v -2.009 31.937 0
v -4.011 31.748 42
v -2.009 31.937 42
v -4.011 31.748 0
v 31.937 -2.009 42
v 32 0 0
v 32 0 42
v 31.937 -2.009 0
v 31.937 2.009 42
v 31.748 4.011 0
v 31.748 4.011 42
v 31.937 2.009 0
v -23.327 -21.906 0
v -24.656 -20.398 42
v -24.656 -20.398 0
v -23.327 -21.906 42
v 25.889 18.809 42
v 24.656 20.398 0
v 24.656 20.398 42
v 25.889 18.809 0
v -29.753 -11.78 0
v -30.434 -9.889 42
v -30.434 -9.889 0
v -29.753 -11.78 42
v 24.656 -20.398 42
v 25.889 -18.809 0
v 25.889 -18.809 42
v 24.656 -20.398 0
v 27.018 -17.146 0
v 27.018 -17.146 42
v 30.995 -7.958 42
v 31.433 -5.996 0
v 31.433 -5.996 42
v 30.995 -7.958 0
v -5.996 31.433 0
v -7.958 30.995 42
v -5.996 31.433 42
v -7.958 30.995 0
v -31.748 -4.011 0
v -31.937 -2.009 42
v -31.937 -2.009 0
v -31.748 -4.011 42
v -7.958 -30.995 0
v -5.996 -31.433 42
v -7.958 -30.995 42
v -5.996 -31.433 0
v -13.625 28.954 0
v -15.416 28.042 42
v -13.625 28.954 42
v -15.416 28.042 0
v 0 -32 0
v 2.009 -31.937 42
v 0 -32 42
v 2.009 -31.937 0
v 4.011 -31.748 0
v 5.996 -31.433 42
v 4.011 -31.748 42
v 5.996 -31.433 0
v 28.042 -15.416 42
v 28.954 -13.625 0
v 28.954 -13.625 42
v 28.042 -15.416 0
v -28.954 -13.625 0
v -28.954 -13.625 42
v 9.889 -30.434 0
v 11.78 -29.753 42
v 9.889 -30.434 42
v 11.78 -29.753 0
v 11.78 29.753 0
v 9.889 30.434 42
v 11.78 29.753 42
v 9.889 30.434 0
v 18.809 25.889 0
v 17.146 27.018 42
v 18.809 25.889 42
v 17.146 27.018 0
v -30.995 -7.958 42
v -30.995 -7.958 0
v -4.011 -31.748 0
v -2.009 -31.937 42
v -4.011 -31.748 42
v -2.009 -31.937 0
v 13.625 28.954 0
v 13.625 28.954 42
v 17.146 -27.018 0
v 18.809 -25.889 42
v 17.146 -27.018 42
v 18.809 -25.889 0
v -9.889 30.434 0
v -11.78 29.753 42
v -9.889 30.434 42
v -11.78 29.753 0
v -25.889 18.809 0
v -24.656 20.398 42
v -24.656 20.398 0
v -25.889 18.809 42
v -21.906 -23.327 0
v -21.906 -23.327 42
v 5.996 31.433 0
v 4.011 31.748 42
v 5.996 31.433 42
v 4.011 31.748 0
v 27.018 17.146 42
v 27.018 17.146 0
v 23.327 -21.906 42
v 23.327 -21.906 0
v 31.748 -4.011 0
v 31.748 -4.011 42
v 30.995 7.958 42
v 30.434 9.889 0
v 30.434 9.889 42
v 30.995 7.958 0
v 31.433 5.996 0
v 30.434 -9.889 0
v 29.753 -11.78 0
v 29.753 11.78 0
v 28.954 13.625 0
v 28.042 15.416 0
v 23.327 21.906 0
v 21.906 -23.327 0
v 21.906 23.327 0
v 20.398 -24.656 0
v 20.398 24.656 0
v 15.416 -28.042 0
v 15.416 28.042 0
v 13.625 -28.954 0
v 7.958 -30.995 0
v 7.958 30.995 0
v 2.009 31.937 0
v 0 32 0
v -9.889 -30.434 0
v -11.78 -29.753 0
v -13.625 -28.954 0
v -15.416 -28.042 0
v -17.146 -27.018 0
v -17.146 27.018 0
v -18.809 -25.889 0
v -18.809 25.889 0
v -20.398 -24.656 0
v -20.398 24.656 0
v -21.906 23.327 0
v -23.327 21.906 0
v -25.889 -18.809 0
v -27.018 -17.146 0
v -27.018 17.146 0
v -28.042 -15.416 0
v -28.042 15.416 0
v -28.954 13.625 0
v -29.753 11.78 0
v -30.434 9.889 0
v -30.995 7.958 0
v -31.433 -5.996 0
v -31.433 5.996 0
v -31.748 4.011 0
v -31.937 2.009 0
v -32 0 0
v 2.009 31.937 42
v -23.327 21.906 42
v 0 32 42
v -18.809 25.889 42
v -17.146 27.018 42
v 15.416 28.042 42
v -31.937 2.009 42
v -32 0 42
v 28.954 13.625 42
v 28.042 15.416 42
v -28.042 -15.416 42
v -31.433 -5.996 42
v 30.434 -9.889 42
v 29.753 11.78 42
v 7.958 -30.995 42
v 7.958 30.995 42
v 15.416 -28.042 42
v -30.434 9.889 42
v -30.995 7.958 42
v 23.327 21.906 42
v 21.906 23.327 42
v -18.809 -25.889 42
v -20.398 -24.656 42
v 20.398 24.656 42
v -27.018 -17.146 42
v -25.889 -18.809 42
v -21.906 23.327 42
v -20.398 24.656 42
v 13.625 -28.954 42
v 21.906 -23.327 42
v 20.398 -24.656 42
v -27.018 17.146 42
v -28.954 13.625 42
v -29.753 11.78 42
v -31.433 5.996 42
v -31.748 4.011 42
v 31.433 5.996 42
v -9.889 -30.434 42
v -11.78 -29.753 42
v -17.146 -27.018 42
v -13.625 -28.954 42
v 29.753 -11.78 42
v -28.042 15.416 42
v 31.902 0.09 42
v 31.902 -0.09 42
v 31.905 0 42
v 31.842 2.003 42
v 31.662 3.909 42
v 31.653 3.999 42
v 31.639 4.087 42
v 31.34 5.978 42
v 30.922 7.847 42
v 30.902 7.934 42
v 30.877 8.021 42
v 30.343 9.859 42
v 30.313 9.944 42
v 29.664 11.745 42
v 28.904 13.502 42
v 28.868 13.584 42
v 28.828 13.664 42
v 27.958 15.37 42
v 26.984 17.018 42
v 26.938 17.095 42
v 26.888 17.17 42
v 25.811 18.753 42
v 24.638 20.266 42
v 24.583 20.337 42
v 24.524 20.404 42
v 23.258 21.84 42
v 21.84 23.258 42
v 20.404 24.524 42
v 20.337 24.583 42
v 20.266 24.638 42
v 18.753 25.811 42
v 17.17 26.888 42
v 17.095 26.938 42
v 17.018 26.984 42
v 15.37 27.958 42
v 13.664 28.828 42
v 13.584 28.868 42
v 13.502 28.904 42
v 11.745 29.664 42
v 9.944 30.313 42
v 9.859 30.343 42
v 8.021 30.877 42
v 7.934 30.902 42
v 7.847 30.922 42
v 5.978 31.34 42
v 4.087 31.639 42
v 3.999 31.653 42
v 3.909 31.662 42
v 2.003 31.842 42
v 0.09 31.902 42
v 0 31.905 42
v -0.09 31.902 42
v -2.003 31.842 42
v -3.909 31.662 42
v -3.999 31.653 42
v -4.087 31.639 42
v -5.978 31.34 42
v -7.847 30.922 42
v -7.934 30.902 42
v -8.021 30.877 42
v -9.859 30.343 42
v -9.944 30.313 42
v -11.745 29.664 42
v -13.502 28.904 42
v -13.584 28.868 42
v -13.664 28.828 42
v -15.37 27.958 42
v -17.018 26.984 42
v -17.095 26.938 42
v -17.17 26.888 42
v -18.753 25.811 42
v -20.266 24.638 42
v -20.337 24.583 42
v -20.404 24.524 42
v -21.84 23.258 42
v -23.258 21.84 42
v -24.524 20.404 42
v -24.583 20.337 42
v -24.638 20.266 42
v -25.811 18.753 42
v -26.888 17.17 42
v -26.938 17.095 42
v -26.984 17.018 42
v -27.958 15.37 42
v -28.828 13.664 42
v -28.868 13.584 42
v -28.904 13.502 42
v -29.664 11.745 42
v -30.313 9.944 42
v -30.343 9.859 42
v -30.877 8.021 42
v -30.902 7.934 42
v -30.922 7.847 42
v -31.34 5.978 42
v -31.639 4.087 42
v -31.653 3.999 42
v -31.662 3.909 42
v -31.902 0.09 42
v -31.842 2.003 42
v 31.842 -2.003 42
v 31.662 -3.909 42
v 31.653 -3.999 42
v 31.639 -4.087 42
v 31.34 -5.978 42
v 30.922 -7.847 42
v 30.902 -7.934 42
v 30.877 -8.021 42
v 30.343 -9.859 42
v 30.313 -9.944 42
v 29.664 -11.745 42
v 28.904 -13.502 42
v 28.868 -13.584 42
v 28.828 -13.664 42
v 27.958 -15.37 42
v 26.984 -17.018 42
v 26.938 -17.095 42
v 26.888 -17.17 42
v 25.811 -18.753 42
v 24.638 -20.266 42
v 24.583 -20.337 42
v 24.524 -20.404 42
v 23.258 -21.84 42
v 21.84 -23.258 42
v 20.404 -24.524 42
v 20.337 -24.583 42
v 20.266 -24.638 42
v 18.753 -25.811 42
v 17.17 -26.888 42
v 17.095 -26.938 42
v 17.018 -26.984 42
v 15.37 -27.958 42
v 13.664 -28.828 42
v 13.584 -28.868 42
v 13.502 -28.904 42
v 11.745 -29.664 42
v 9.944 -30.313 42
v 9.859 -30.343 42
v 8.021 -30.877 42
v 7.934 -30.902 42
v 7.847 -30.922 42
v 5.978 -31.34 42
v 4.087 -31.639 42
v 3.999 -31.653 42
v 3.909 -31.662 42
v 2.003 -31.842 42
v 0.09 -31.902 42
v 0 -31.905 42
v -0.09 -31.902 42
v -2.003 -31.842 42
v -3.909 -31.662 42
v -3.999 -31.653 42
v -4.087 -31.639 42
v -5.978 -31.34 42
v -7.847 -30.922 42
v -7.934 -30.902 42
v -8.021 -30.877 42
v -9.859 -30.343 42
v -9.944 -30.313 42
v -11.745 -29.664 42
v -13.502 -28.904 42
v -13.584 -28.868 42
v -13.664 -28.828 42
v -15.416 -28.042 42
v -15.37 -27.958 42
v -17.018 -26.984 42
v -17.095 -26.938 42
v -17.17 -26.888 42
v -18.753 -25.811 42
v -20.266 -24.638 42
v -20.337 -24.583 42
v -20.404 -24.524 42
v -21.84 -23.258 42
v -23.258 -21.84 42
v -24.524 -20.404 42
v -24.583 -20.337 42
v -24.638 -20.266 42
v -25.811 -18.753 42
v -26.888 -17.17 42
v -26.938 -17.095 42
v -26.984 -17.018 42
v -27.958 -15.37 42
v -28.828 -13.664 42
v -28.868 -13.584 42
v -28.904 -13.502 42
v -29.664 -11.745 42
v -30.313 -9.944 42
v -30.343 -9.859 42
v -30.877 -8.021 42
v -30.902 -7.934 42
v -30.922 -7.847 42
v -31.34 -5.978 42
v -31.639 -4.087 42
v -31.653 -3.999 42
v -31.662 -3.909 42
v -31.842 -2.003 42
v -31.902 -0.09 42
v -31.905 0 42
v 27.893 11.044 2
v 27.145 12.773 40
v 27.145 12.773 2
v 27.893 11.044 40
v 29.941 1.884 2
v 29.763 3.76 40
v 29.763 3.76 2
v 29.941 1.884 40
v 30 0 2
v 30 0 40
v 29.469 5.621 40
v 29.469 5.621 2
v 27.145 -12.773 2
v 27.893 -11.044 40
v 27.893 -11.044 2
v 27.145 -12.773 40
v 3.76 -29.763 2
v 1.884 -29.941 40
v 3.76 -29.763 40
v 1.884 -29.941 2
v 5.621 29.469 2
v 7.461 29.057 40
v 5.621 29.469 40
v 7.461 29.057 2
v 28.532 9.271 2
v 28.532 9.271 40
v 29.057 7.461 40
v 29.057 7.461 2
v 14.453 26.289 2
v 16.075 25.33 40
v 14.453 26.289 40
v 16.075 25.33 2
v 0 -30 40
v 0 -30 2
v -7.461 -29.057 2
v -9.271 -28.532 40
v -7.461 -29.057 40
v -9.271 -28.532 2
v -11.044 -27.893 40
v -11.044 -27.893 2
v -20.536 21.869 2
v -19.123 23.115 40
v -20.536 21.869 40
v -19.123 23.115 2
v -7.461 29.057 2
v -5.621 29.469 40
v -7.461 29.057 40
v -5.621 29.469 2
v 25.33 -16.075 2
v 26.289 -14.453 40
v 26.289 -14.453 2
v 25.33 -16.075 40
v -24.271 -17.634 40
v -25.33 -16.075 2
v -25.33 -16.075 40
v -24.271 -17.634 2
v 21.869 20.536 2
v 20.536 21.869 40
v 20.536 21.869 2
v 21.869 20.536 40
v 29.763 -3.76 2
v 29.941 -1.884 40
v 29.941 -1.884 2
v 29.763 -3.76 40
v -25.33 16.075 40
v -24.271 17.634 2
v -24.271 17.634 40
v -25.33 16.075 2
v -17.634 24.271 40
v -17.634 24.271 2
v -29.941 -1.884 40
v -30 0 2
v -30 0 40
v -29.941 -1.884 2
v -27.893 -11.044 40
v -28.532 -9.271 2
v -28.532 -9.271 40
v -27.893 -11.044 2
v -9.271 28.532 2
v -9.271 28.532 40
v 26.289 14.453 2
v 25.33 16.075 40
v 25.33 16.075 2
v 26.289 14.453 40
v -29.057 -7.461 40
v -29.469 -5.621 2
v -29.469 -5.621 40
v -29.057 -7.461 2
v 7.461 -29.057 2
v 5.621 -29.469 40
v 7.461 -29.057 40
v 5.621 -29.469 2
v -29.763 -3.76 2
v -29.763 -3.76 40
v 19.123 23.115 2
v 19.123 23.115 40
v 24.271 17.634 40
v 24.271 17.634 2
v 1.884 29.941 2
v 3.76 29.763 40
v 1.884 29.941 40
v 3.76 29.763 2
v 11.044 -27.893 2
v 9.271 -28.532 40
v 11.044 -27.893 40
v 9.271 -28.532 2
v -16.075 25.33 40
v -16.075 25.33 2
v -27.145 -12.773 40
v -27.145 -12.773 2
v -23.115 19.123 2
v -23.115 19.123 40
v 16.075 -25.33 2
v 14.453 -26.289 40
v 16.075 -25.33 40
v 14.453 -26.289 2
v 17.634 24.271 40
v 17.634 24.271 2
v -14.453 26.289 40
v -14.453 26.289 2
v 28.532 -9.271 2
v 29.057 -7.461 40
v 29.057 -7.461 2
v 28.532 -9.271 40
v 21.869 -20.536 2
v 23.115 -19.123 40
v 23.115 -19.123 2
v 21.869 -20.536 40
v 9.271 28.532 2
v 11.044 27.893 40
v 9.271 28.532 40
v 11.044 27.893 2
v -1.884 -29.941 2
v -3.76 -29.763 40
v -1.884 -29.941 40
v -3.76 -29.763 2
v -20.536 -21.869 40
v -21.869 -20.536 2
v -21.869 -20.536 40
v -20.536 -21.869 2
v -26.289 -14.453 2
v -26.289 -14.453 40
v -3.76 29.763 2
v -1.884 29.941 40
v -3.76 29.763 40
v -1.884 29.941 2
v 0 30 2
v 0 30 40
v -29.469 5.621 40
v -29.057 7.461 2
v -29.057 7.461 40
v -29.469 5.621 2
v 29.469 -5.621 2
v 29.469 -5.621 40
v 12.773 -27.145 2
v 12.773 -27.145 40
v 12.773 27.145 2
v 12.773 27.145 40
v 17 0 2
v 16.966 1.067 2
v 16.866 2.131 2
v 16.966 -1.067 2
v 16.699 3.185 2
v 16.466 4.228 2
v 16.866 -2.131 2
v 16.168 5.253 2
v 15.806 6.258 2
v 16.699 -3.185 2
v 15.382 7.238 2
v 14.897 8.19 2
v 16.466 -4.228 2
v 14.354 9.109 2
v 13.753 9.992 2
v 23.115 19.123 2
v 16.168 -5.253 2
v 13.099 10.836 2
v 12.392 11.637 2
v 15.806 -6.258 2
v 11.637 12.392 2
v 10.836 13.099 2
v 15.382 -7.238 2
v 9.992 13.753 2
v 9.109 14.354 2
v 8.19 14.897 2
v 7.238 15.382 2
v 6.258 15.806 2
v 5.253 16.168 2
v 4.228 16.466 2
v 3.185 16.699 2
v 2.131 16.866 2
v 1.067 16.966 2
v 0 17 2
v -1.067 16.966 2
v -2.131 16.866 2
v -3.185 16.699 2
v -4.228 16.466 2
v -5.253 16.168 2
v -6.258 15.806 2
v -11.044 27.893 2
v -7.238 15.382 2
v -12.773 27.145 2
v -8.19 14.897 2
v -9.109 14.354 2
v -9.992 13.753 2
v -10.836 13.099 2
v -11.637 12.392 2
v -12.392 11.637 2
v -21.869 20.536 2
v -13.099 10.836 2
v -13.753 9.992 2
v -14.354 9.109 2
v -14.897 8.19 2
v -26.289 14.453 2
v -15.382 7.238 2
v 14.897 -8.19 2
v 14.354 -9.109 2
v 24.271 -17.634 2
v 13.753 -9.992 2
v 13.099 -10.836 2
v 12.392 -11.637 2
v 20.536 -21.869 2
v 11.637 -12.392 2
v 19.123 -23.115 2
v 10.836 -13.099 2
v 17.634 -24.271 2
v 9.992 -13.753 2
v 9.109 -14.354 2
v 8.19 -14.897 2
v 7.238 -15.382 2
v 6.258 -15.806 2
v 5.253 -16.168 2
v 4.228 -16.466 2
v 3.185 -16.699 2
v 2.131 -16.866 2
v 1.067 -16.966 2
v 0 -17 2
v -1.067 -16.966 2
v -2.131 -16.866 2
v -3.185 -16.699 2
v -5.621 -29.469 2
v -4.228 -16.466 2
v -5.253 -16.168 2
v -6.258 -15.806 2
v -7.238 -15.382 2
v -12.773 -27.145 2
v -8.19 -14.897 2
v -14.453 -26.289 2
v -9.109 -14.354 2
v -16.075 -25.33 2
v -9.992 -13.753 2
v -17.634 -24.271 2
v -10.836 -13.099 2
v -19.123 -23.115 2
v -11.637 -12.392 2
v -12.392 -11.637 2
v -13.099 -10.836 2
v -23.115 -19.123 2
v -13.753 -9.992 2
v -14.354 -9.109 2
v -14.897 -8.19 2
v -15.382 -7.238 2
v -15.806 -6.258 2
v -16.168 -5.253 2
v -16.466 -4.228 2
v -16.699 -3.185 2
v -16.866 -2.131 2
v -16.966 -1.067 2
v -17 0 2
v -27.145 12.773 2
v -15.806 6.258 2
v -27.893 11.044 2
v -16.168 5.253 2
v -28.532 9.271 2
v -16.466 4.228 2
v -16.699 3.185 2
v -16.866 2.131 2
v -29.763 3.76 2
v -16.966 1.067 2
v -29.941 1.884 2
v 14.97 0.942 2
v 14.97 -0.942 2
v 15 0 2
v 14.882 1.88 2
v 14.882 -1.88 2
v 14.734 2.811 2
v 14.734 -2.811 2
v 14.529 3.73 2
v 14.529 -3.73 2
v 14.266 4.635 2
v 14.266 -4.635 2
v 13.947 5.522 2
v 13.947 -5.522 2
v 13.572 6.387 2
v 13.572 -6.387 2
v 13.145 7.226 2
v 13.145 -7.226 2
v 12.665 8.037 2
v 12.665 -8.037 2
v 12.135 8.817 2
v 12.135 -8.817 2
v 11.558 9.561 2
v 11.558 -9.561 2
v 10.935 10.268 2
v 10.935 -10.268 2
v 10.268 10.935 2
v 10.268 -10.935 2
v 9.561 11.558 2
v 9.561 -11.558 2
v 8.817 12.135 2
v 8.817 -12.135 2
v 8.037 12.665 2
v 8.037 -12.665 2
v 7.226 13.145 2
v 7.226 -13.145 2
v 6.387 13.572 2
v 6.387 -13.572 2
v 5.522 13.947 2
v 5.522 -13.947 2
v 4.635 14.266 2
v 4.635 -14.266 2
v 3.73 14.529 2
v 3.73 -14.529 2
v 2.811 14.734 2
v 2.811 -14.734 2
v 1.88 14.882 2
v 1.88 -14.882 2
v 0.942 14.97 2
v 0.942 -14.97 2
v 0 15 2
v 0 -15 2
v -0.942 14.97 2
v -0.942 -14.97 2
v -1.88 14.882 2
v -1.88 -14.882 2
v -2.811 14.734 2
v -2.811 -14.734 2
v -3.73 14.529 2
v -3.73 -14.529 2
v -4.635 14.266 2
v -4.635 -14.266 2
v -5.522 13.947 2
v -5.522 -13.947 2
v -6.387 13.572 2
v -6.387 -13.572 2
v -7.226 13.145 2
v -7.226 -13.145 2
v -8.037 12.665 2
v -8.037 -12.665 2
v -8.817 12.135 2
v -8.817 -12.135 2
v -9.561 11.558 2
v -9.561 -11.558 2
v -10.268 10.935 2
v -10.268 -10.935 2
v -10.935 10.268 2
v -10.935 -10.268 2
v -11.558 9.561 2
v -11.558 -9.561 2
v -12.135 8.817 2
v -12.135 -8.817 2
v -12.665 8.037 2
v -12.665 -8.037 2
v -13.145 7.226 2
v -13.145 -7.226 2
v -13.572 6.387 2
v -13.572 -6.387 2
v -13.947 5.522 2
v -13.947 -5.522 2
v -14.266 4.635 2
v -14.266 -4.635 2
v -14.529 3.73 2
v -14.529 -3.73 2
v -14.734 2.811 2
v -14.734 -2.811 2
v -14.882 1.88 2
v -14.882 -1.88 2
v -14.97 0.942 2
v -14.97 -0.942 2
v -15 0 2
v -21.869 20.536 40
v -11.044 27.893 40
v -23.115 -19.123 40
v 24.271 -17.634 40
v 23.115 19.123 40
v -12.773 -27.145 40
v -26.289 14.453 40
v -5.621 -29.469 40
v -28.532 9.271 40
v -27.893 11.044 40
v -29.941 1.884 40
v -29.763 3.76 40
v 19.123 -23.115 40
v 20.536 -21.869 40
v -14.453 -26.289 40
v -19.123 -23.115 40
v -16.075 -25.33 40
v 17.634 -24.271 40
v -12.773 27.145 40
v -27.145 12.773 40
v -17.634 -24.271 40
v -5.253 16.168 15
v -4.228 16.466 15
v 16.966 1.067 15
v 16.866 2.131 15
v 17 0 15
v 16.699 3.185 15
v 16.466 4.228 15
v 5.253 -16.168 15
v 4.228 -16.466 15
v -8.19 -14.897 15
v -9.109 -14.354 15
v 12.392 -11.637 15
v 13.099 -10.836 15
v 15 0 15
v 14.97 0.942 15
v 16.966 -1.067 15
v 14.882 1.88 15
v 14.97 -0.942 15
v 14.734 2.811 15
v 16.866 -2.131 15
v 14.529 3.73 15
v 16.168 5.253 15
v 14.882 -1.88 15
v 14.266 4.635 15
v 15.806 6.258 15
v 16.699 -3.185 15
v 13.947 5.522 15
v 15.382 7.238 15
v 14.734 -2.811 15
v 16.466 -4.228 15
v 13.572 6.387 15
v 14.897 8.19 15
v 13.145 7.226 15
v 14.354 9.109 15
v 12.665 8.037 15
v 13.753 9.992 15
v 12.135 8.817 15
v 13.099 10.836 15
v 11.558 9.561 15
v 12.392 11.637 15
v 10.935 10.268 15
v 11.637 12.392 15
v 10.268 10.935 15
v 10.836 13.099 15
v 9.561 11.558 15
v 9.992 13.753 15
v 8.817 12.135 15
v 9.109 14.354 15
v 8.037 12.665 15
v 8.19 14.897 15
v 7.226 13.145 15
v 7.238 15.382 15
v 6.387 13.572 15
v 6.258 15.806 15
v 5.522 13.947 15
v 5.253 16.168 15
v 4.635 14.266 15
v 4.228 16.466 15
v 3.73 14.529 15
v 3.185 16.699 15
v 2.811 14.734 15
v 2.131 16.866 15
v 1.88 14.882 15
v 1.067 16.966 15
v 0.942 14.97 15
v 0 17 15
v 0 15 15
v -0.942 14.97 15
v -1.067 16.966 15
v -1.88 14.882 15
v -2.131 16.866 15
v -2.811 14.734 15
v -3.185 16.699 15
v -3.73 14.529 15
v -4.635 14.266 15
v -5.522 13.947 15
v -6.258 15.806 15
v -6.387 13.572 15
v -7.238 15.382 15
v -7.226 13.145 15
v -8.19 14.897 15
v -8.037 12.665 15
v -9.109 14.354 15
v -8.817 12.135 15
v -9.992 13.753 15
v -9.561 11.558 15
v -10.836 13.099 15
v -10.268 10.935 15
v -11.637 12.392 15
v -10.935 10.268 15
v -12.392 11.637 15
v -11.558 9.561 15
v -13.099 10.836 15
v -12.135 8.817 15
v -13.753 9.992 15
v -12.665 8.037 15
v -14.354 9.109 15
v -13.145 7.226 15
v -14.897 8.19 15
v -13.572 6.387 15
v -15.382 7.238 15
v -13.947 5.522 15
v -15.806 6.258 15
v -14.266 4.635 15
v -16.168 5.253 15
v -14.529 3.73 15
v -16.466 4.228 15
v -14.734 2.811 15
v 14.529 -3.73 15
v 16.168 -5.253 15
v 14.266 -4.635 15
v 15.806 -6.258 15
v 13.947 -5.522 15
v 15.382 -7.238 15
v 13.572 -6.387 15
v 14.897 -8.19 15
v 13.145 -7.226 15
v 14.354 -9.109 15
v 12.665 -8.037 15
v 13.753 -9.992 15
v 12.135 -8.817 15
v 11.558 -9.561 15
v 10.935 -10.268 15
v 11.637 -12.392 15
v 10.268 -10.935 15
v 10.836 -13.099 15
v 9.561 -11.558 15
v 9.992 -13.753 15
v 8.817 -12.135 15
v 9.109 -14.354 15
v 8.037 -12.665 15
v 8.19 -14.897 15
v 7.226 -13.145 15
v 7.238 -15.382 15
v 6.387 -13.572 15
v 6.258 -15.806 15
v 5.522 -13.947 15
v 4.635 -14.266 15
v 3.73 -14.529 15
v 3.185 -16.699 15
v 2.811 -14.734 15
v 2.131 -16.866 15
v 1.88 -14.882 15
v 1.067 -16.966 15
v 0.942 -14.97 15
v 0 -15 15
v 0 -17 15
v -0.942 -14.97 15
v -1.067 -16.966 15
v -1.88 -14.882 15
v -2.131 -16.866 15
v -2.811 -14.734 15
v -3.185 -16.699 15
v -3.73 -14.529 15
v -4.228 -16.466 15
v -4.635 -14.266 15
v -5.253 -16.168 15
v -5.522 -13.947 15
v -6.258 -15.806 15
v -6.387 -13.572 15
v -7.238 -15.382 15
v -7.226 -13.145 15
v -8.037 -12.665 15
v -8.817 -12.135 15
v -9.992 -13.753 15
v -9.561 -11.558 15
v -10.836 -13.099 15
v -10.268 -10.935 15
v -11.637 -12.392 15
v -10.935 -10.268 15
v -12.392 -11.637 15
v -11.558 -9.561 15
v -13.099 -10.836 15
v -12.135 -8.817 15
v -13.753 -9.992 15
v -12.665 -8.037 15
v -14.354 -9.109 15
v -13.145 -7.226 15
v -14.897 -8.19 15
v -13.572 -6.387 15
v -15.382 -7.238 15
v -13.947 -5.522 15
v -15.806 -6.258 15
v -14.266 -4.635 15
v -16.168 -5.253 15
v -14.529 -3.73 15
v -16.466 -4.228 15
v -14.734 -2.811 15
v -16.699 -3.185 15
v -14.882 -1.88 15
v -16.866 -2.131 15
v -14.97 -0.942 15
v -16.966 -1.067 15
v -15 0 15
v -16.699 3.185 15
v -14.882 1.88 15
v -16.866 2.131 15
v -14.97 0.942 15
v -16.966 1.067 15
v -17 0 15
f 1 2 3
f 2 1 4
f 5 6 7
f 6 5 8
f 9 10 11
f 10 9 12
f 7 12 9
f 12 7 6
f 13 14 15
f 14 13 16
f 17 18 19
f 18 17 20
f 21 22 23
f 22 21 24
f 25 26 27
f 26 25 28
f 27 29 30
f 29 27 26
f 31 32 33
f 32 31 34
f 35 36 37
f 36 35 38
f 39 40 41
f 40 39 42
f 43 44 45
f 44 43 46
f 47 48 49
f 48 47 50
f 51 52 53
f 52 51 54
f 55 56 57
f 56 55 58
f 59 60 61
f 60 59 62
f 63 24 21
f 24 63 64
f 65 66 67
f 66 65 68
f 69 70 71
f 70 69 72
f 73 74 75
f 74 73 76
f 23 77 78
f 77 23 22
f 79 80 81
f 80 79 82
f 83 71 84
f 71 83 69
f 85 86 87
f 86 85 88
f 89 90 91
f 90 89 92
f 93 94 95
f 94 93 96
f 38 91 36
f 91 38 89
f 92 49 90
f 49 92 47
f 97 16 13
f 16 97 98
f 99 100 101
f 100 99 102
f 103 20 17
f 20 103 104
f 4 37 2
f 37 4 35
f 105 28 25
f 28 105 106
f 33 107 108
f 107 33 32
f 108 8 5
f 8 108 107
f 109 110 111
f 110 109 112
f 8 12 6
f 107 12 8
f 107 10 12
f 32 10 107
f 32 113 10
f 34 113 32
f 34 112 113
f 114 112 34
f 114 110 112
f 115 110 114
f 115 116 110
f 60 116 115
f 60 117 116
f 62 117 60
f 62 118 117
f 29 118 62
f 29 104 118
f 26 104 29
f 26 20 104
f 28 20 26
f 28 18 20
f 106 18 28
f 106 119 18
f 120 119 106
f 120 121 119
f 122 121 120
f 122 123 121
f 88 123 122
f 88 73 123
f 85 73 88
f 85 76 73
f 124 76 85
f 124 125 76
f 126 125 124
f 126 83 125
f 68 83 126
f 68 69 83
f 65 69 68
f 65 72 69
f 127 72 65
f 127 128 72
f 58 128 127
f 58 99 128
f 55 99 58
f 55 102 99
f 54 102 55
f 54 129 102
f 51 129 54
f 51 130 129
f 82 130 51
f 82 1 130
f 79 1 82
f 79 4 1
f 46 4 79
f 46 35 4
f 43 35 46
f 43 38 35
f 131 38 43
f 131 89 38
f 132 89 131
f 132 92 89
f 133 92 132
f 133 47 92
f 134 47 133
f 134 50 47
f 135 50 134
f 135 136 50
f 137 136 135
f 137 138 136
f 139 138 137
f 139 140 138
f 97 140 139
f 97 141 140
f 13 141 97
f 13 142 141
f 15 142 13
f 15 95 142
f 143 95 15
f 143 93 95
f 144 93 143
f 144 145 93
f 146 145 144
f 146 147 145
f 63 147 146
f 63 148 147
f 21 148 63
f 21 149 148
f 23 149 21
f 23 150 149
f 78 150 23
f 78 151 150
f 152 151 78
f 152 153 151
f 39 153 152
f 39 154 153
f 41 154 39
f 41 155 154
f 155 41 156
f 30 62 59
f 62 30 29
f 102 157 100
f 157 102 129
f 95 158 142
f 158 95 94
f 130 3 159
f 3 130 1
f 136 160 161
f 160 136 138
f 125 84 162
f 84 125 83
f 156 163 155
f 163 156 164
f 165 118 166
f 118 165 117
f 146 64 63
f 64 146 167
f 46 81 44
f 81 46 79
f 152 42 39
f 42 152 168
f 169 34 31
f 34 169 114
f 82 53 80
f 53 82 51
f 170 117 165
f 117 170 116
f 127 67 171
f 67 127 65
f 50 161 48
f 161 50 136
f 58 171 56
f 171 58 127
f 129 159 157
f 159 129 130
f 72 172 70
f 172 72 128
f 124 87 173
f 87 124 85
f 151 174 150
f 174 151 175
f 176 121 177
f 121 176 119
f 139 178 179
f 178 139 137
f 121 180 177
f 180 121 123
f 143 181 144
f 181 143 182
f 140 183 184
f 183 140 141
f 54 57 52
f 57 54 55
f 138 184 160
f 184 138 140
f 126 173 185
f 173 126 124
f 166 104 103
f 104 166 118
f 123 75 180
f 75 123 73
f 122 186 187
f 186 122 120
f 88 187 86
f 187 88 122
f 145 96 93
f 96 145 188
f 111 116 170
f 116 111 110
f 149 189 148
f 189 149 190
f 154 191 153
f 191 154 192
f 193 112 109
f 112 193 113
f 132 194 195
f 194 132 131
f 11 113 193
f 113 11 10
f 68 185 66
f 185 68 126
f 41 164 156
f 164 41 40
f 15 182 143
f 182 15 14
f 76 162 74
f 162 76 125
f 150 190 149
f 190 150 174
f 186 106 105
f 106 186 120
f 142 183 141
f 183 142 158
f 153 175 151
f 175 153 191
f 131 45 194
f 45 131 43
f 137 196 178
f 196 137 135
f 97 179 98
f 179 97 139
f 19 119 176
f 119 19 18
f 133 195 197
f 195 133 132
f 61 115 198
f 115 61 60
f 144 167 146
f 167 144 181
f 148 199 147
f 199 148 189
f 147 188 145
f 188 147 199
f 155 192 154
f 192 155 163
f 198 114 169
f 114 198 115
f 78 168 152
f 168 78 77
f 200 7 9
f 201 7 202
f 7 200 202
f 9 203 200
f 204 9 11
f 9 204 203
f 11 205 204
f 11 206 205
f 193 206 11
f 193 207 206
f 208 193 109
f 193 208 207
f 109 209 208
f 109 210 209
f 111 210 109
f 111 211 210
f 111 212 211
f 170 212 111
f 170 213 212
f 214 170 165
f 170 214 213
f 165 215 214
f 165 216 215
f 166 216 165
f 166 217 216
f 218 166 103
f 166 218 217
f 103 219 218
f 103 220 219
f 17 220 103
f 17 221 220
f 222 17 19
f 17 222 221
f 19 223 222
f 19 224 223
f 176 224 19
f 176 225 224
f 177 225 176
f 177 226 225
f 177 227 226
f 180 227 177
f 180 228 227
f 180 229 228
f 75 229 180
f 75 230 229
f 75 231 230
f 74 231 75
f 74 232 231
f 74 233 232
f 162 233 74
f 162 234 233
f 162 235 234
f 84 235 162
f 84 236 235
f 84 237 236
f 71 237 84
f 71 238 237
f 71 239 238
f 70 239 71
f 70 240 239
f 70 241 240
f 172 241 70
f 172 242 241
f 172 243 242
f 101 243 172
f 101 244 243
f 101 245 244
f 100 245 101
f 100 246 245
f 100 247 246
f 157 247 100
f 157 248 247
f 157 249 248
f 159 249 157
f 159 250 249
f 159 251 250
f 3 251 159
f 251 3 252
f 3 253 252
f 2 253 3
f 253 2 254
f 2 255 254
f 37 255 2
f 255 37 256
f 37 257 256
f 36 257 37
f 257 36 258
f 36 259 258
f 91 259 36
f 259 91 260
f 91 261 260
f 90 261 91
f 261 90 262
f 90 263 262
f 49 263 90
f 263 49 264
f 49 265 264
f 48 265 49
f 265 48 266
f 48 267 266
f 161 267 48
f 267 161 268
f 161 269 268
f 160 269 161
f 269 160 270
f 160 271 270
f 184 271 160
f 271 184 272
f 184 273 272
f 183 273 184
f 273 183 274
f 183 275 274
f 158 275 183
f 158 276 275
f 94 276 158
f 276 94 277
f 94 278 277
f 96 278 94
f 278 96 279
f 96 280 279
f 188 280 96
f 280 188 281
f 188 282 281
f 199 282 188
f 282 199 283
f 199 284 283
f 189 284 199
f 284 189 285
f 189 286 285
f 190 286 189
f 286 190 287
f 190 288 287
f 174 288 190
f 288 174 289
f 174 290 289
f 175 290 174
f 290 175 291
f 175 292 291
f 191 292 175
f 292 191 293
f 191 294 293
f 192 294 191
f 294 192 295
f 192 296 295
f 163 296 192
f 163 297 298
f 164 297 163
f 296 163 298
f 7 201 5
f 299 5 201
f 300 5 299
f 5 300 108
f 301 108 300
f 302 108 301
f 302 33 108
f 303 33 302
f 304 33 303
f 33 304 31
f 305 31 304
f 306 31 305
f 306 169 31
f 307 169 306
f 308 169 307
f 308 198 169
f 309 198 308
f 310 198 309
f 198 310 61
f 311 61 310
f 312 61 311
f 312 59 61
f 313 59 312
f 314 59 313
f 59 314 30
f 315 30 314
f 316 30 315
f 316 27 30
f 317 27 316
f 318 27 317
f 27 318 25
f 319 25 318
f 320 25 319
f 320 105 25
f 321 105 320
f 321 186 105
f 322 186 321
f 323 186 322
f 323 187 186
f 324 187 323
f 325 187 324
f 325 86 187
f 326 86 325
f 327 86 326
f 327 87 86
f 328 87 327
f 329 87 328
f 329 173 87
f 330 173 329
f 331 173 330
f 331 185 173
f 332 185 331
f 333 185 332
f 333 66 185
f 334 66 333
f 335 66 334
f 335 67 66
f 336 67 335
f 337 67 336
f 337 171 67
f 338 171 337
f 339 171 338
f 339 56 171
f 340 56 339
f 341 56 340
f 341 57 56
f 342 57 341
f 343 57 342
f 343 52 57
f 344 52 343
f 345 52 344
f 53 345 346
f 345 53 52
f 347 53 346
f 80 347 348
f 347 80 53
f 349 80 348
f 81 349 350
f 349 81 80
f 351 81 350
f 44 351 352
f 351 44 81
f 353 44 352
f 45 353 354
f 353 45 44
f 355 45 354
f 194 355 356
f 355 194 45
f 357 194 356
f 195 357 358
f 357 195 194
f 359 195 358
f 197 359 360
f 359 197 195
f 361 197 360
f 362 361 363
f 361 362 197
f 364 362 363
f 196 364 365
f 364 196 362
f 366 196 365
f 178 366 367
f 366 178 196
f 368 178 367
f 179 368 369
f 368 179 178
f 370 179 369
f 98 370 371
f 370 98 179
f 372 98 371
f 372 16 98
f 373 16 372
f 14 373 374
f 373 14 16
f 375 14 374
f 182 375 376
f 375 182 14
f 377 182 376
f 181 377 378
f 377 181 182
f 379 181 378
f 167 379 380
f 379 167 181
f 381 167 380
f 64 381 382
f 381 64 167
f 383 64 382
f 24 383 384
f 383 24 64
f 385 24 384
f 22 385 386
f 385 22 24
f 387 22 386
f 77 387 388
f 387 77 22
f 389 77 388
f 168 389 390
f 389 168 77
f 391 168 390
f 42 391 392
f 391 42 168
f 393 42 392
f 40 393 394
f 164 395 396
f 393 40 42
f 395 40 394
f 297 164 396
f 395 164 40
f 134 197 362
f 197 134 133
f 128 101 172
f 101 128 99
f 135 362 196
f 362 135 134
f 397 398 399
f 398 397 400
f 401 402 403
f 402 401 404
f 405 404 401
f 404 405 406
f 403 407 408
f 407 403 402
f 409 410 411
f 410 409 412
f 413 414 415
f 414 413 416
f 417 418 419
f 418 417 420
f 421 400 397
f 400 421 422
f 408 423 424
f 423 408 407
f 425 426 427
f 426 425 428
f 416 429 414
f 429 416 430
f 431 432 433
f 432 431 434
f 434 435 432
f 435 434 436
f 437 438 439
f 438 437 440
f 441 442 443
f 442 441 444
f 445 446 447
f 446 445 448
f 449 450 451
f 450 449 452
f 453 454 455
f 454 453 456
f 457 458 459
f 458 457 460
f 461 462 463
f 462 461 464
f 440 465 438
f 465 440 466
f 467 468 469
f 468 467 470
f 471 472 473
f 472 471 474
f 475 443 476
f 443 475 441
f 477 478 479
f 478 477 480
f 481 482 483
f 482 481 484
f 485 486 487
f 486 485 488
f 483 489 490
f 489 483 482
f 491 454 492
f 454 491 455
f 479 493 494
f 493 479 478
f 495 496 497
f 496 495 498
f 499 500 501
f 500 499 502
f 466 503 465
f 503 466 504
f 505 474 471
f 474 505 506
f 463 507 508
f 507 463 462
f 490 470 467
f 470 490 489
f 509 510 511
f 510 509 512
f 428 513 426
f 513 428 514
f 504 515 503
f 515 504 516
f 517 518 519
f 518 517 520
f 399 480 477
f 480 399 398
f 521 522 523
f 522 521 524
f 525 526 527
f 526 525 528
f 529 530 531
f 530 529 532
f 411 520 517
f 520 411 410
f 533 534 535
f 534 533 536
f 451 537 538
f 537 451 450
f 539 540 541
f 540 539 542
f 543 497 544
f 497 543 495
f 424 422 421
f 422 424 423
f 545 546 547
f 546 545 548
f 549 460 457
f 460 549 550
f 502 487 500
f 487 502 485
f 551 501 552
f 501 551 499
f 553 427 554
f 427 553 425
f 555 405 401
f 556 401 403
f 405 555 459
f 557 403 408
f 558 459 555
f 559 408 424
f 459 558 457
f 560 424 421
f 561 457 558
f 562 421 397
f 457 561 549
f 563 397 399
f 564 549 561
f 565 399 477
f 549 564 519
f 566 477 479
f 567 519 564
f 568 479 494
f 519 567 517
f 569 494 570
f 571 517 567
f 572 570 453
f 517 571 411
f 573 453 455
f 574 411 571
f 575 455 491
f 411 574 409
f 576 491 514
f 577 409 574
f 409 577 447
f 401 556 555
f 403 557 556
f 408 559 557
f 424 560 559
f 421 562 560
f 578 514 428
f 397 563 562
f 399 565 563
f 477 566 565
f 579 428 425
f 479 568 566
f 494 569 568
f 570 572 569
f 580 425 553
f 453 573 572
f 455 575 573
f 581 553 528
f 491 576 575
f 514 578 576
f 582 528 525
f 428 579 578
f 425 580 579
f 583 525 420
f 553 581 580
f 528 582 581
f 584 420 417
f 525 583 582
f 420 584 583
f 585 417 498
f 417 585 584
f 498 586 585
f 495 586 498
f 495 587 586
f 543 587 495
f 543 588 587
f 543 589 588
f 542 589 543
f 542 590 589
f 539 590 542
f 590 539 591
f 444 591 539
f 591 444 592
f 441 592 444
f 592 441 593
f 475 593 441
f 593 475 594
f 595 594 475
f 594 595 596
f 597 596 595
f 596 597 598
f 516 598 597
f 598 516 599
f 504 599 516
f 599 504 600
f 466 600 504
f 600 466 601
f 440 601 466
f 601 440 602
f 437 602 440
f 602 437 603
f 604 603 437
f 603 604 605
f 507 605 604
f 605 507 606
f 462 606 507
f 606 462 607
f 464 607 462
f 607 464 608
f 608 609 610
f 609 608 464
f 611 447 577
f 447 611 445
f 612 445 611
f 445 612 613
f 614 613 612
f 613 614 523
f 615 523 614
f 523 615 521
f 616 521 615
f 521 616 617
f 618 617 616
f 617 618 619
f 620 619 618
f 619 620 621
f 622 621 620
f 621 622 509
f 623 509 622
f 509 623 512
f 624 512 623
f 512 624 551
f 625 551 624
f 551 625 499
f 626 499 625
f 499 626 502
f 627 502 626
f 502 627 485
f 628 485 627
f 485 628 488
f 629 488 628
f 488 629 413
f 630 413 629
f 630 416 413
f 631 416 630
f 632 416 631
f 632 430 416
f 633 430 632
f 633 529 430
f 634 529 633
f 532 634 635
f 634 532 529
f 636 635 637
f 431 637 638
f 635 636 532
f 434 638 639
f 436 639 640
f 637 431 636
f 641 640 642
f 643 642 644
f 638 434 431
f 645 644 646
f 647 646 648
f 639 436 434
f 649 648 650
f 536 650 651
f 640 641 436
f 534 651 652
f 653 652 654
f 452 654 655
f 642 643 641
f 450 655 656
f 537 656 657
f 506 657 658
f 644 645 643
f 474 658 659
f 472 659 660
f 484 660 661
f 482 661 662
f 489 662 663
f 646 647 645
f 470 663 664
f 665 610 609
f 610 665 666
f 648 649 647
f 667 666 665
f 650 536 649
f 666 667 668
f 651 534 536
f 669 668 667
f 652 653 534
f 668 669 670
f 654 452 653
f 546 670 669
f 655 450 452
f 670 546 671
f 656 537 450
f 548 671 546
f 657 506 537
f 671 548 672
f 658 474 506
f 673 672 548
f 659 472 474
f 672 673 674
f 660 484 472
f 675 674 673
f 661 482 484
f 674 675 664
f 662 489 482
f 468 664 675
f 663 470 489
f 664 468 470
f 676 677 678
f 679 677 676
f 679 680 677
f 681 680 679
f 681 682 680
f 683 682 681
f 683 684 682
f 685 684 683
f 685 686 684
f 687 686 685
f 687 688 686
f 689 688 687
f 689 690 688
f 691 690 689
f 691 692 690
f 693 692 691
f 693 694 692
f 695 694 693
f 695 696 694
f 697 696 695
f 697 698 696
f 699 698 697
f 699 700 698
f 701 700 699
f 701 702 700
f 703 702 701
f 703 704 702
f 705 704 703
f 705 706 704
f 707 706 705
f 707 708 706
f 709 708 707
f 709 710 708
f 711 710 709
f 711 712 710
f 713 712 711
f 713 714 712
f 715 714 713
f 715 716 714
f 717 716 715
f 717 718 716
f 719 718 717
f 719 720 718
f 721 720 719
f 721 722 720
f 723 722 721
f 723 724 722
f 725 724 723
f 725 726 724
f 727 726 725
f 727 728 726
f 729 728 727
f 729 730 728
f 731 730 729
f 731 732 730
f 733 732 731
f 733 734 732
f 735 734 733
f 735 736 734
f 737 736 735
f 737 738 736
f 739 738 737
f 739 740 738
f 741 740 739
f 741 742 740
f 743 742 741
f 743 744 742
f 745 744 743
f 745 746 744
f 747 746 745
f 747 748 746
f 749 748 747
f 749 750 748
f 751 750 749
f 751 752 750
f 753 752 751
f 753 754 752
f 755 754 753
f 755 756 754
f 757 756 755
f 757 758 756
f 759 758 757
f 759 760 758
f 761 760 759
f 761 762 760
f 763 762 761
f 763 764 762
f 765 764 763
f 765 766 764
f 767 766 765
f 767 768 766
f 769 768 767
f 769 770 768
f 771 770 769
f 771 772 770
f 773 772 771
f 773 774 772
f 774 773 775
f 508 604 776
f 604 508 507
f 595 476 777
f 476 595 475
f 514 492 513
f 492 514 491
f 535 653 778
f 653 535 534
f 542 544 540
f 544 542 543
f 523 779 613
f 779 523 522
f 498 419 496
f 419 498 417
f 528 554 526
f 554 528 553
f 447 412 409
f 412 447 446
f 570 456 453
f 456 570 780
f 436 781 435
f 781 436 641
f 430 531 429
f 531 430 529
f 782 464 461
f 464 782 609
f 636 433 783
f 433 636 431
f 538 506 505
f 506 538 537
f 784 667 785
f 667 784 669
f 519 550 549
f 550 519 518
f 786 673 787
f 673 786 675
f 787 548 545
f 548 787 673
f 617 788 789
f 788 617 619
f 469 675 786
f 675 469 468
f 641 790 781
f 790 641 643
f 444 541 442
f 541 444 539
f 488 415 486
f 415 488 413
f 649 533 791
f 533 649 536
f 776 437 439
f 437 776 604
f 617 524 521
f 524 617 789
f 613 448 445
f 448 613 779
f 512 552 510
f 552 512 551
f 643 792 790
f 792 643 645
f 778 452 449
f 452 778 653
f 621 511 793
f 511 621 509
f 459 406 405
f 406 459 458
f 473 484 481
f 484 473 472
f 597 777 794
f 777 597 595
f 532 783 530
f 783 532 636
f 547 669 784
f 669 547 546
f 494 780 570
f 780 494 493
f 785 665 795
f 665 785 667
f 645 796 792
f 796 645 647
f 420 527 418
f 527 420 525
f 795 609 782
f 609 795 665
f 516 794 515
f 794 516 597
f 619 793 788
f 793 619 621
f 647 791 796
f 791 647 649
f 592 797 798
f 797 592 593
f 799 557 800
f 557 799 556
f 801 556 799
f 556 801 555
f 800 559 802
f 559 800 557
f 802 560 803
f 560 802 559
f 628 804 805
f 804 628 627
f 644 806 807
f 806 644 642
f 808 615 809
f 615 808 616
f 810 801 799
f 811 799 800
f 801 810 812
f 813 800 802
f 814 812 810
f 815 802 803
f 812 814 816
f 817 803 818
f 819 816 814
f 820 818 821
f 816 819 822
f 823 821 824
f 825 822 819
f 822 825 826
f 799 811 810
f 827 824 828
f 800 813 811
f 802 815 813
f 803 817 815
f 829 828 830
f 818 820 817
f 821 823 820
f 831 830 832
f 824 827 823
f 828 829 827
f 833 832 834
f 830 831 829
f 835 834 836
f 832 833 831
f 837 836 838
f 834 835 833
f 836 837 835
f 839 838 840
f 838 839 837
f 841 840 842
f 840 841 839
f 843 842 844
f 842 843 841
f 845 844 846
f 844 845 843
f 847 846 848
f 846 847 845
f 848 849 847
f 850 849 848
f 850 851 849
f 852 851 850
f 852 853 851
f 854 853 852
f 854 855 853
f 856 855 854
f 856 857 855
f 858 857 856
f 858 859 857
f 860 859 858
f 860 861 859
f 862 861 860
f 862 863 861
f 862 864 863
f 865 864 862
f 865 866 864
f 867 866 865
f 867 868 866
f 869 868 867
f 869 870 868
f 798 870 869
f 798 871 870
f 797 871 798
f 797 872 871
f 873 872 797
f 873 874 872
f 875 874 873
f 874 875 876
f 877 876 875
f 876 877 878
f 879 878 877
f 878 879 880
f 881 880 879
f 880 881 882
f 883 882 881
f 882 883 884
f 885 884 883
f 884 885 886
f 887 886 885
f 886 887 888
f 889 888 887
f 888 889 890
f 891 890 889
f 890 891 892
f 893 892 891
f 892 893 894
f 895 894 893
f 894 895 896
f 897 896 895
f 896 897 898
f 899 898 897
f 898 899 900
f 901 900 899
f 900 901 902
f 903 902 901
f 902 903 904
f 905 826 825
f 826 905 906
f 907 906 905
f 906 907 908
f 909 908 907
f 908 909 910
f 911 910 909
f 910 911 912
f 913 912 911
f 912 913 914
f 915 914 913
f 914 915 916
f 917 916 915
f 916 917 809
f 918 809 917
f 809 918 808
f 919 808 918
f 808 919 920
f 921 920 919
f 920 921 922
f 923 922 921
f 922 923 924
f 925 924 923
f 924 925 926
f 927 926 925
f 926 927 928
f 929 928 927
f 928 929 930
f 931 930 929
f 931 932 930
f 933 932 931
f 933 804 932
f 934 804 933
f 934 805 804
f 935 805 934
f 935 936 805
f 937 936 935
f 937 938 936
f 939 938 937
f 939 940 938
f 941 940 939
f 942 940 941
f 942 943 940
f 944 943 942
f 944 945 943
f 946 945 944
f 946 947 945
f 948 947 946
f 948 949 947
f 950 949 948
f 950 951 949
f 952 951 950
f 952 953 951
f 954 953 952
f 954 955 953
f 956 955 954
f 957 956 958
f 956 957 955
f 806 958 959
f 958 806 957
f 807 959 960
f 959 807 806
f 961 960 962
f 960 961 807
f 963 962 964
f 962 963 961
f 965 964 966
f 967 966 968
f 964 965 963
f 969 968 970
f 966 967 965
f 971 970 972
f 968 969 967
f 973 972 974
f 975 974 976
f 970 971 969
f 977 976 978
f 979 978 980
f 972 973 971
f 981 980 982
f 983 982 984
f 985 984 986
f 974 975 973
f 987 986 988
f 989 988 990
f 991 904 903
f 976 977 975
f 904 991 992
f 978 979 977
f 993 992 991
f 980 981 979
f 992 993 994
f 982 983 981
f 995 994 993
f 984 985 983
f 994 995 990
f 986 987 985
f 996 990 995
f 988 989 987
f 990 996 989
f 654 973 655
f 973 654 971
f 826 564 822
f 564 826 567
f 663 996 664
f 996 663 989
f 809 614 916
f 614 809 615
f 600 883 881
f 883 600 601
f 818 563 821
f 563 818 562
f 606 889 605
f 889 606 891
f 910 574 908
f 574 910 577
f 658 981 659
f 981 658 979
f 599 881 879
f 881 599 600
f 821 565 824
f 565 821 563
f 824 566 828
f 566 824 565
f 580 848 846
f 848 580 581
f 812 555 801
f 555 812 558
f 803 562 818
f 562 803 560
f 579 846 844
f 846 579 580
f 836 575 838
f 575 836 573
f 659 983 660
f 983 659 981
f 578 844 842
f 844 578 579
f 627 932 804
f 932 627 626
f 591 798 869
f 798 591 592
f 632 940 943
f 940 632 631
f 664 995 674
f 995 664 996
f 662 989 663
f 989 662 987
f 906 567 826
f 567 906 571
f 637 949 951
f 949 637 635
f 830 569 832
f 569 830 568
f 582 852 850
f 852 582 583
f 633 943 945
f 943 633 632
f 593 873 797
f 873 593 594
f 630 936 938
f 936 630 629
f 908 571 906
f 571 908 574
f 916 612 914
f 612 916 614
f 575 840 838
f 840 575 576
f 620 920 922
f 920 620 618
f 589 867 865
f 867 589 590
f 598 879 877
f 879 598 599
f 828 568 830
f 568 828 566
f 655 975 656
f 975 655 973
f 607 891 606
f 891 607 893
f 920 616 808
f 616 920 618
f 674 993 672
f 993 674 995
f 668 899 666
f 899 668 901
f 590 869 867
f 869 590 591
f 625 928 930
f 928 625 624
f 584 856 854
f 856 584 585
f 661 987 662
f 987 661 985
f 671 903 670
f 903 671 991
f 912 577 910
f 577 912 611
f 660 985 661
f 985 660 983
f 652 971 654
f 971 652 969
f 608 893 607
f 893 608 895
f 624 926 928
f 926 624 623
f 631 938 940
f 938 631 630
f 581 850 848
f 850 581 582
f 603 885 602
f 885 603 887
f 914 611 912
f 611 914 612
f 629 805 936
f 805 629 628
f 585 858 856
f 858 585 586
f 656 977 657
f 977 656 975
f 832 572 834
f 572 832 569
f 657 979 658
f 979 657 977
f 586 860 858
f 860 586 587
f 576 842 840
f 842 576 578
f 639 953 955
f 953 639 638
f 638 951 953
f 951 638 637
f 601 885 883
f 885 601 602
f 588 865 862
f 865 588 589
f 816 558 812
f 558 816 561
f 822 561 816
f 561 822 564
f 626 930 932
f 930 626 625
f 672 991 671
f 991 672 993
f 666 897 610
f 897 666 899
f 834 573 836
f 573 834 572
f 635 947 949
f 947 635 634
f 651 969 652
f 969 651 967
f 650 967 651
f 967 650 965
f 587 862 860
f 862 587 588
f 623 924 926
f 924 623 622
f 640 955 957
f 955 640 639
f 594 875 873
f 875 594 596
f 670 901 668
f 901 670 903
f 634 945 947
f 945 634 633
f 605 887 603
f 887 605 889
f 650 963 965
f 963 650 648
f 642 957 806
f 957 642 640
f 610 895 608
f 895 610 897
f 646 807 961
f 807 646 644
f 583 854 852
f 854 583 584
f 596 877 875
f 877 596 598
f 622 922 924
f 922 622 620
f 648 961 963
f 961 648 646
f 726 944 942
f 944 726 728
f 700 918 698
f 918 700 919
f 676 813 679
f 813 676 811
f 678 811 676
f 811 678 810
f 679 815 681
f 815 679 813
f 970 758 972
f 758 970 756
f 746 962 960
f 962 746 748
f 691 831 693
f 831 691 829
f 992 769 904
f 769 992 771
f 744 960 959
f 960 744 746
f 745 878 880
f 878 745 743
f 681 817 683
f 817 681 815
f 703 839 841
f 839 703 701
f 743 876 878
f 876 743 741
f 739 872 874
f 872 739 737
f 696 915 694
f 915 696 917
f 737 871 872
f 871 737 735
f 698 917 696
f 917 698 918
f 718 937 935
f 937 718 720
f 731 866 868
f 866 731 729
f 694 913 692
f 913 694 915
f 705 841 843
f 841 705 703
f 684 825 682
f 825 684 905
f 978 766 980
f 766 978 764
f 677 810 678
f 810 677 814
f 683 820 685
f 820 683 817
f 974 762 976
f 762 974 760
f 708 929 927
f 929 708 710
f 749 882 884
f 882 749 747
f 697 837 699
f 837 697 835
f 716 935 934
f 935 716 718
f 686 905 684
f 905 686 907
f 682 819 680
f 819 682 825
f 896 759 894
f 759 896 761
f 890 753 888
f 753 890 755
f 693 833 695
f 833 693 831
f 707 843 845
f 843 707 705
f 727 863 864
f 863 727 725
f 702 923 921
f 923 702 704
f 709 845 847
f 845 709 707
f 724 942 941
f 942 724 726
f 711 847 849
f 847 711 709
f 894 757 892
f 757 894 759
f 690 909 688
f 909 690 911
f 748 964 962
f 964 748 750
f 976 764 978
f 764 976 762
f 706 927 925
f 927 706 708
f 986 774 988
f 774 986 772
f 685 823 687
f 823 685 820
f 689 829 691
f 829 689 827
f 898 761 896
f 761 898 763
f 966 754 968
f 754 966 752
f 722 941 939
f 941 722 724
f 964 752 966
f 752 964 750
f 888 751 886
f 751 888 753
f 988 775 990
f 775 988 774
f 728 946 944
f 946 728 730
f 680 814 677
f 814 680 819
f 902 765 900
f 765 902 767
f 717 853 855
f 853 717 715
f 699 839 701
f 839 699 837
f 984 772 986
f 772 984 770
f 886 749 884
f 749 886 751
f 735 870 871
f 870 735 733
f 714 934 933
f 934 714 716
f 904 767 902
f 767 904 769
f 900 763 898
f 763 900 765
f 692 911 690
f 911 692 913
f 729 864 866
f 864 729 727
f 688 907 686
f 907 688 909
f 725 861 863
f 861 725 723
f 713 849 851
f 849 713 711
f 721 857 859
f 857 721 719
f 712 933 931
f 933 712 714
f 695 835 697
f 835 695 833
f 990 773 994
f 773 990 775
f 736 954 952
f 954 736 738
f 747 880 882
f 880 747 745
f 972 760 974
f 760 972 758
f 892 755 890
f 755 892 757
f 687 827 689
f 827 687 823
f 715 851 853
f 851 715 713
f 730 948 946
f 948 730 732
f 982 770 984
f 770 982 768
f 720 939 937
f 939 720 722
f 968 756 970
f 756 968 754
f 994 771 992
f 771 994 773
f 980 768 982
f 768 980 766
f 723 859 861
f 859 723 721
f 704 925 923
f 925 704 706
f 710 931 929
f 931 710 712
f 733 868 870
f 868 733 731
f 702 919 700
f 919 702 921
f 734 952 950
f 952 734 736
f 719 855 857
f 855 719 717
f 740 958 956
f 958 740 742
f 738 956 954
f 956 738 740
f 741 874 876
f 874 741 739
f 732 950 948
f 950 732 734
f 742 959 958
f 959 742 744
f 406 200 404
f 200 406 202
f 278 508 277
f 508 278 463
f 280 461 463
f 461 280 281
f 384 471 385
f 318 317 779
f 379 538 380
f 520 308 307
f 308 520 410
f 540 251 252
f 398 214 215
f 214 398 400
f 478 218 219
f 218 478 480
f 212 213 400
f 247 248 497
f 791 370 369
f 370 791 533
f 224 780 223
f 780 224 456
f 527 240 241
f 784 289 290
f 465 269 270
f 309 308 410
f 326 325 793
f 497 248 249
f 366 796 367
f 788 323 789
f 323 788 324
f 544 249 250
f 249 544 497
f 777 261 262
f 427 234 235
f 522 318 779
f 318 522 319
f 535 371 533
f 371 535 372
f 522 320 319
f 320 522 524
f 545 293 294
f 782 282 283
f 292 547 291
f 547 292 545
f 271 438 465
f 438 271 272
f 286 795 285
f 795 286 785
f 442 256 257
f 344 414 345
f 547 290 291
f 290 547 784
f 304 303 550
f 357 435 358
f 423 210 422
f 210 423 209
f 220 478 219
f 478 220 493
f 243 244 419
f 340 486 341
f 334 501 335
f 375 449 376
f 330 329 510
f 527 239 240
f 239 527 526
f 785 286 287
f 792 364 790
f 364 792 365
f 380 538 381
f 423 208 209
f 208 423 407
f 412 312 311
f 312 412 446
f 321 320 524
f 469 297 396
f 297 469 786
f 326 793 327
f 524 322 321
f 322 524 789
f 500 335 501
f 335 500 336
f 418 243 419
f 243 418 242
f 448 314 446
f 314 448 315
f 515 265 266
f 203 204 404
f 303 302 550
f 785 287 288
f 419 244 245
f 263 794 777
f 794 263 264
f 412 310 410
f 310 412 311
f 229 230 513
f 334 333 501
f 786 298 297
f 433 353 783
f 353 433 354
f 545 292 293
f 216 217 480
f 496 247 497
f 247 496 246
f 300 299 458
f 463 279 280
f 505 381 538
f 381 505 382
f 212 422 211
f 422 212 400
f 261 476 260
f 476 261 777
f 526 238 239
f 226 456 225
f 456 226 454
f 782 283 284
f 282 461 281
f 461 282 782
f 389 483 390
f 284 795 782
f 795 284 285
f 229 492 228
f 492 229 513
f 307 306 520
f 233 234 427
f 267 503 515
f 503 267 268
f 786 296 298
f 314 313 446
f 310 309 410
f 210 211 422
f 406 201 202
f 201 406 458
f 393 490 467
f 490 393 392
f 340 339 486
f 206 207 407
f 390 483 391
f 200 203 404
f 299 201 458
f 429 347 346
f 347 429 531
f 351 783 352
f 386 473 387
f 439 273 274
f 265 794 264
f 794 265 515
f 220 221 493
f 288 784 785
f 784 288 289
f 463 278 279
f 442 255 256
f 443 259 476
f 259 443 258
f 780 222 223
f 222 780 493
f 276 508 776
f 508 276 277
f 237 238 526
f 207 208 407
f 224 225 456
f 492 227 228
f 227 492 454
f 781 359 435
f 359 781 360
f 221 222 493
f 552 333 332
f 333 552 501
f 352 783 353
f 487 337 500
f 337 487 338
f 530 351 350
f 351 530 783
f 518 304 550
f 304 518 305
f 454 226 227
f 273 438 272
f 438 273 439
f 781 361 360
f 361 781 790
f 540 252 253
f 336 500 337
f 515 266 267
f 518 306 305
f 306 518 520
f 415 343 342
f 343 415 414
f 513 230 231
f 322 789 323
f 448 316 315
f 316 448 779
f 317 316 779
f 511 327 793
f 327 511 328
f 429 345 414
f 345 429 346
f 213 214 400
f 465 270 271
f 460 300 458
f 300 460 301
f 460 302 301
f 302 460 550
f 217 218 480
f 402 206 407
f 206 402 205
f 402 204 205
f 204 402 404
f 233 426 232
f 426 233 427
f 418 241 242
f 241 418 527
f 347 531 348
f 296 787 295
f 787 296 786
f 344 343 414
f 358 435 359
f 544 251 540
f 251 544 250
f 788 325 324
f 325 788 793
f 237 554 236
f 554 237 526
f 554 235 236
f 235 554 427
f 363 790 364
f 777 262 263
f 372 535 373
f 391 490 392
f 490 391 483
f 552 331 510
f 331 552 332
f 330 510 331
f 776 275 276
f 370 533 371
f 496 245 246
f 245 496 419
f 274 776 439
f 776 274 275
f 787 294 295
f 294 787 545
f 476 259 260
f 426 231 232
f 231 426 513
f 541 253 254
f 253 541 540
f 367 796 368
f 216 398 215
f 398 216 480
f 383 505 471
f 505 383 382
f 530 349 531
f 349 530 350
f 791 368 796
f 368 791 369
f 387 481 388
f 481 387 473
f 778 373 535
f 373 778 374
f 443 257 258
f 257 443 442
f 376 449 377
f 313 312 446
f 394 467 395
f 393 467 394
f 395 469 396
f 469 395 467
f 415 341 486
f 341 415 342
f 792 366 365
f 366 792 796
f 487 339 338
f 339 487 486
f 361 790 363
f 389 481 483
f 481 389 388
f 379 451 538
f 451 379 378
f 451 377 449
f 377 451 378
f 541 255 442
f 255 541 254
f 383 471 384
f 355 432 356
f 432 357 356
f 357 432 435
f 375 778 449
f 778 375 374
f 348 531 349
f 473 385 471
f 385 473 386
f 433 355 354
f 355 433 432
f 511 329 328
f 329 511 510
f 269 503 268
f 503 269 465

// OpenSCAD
// Diameter of the container's cap
capdia=30;

// Height of the container's cap
capheight=13;

// Diameter of the post
postdia=60;

// Elements height
elementheight=40;

// Wall strength
wall=2;




capradius=(capdia/2);
postradius=(postdia/2);

// Checks
if (capheight > elementheight)
{
    echo ("Capheight higher than elementheight. Please change it.");
}
else
{
    if((capradius+wall) >= postradius)
    {
        echo ("Your diameter settings don't make sense... Please check");
    } else
    {
        difference(){
            union(){
                difference(){
                    cylinder(h=(elementheight+wall),r=(postradius+wall), $fn = 100);
                    translate([0, 0, wall])
                    cylinder(h=(elementheight+0.1),r=postradius, $fn = 100);
                };

                difference(){
                    cylinder(h=(capheight+wall),r=(capradius+wall), $fn = 100);
                    translate([0, 0, wall])
                    cylinder(h=(capheight+0.1),r=capradius, $fn = 100);
                };
            };
         
            translate([0, 0, elementheight])
            cylinder(h=(wall+0.1),
                    r2=(postradius+wall), 
                    r1=(postradius), 
                    $fn = 100);
        }
    }

}
